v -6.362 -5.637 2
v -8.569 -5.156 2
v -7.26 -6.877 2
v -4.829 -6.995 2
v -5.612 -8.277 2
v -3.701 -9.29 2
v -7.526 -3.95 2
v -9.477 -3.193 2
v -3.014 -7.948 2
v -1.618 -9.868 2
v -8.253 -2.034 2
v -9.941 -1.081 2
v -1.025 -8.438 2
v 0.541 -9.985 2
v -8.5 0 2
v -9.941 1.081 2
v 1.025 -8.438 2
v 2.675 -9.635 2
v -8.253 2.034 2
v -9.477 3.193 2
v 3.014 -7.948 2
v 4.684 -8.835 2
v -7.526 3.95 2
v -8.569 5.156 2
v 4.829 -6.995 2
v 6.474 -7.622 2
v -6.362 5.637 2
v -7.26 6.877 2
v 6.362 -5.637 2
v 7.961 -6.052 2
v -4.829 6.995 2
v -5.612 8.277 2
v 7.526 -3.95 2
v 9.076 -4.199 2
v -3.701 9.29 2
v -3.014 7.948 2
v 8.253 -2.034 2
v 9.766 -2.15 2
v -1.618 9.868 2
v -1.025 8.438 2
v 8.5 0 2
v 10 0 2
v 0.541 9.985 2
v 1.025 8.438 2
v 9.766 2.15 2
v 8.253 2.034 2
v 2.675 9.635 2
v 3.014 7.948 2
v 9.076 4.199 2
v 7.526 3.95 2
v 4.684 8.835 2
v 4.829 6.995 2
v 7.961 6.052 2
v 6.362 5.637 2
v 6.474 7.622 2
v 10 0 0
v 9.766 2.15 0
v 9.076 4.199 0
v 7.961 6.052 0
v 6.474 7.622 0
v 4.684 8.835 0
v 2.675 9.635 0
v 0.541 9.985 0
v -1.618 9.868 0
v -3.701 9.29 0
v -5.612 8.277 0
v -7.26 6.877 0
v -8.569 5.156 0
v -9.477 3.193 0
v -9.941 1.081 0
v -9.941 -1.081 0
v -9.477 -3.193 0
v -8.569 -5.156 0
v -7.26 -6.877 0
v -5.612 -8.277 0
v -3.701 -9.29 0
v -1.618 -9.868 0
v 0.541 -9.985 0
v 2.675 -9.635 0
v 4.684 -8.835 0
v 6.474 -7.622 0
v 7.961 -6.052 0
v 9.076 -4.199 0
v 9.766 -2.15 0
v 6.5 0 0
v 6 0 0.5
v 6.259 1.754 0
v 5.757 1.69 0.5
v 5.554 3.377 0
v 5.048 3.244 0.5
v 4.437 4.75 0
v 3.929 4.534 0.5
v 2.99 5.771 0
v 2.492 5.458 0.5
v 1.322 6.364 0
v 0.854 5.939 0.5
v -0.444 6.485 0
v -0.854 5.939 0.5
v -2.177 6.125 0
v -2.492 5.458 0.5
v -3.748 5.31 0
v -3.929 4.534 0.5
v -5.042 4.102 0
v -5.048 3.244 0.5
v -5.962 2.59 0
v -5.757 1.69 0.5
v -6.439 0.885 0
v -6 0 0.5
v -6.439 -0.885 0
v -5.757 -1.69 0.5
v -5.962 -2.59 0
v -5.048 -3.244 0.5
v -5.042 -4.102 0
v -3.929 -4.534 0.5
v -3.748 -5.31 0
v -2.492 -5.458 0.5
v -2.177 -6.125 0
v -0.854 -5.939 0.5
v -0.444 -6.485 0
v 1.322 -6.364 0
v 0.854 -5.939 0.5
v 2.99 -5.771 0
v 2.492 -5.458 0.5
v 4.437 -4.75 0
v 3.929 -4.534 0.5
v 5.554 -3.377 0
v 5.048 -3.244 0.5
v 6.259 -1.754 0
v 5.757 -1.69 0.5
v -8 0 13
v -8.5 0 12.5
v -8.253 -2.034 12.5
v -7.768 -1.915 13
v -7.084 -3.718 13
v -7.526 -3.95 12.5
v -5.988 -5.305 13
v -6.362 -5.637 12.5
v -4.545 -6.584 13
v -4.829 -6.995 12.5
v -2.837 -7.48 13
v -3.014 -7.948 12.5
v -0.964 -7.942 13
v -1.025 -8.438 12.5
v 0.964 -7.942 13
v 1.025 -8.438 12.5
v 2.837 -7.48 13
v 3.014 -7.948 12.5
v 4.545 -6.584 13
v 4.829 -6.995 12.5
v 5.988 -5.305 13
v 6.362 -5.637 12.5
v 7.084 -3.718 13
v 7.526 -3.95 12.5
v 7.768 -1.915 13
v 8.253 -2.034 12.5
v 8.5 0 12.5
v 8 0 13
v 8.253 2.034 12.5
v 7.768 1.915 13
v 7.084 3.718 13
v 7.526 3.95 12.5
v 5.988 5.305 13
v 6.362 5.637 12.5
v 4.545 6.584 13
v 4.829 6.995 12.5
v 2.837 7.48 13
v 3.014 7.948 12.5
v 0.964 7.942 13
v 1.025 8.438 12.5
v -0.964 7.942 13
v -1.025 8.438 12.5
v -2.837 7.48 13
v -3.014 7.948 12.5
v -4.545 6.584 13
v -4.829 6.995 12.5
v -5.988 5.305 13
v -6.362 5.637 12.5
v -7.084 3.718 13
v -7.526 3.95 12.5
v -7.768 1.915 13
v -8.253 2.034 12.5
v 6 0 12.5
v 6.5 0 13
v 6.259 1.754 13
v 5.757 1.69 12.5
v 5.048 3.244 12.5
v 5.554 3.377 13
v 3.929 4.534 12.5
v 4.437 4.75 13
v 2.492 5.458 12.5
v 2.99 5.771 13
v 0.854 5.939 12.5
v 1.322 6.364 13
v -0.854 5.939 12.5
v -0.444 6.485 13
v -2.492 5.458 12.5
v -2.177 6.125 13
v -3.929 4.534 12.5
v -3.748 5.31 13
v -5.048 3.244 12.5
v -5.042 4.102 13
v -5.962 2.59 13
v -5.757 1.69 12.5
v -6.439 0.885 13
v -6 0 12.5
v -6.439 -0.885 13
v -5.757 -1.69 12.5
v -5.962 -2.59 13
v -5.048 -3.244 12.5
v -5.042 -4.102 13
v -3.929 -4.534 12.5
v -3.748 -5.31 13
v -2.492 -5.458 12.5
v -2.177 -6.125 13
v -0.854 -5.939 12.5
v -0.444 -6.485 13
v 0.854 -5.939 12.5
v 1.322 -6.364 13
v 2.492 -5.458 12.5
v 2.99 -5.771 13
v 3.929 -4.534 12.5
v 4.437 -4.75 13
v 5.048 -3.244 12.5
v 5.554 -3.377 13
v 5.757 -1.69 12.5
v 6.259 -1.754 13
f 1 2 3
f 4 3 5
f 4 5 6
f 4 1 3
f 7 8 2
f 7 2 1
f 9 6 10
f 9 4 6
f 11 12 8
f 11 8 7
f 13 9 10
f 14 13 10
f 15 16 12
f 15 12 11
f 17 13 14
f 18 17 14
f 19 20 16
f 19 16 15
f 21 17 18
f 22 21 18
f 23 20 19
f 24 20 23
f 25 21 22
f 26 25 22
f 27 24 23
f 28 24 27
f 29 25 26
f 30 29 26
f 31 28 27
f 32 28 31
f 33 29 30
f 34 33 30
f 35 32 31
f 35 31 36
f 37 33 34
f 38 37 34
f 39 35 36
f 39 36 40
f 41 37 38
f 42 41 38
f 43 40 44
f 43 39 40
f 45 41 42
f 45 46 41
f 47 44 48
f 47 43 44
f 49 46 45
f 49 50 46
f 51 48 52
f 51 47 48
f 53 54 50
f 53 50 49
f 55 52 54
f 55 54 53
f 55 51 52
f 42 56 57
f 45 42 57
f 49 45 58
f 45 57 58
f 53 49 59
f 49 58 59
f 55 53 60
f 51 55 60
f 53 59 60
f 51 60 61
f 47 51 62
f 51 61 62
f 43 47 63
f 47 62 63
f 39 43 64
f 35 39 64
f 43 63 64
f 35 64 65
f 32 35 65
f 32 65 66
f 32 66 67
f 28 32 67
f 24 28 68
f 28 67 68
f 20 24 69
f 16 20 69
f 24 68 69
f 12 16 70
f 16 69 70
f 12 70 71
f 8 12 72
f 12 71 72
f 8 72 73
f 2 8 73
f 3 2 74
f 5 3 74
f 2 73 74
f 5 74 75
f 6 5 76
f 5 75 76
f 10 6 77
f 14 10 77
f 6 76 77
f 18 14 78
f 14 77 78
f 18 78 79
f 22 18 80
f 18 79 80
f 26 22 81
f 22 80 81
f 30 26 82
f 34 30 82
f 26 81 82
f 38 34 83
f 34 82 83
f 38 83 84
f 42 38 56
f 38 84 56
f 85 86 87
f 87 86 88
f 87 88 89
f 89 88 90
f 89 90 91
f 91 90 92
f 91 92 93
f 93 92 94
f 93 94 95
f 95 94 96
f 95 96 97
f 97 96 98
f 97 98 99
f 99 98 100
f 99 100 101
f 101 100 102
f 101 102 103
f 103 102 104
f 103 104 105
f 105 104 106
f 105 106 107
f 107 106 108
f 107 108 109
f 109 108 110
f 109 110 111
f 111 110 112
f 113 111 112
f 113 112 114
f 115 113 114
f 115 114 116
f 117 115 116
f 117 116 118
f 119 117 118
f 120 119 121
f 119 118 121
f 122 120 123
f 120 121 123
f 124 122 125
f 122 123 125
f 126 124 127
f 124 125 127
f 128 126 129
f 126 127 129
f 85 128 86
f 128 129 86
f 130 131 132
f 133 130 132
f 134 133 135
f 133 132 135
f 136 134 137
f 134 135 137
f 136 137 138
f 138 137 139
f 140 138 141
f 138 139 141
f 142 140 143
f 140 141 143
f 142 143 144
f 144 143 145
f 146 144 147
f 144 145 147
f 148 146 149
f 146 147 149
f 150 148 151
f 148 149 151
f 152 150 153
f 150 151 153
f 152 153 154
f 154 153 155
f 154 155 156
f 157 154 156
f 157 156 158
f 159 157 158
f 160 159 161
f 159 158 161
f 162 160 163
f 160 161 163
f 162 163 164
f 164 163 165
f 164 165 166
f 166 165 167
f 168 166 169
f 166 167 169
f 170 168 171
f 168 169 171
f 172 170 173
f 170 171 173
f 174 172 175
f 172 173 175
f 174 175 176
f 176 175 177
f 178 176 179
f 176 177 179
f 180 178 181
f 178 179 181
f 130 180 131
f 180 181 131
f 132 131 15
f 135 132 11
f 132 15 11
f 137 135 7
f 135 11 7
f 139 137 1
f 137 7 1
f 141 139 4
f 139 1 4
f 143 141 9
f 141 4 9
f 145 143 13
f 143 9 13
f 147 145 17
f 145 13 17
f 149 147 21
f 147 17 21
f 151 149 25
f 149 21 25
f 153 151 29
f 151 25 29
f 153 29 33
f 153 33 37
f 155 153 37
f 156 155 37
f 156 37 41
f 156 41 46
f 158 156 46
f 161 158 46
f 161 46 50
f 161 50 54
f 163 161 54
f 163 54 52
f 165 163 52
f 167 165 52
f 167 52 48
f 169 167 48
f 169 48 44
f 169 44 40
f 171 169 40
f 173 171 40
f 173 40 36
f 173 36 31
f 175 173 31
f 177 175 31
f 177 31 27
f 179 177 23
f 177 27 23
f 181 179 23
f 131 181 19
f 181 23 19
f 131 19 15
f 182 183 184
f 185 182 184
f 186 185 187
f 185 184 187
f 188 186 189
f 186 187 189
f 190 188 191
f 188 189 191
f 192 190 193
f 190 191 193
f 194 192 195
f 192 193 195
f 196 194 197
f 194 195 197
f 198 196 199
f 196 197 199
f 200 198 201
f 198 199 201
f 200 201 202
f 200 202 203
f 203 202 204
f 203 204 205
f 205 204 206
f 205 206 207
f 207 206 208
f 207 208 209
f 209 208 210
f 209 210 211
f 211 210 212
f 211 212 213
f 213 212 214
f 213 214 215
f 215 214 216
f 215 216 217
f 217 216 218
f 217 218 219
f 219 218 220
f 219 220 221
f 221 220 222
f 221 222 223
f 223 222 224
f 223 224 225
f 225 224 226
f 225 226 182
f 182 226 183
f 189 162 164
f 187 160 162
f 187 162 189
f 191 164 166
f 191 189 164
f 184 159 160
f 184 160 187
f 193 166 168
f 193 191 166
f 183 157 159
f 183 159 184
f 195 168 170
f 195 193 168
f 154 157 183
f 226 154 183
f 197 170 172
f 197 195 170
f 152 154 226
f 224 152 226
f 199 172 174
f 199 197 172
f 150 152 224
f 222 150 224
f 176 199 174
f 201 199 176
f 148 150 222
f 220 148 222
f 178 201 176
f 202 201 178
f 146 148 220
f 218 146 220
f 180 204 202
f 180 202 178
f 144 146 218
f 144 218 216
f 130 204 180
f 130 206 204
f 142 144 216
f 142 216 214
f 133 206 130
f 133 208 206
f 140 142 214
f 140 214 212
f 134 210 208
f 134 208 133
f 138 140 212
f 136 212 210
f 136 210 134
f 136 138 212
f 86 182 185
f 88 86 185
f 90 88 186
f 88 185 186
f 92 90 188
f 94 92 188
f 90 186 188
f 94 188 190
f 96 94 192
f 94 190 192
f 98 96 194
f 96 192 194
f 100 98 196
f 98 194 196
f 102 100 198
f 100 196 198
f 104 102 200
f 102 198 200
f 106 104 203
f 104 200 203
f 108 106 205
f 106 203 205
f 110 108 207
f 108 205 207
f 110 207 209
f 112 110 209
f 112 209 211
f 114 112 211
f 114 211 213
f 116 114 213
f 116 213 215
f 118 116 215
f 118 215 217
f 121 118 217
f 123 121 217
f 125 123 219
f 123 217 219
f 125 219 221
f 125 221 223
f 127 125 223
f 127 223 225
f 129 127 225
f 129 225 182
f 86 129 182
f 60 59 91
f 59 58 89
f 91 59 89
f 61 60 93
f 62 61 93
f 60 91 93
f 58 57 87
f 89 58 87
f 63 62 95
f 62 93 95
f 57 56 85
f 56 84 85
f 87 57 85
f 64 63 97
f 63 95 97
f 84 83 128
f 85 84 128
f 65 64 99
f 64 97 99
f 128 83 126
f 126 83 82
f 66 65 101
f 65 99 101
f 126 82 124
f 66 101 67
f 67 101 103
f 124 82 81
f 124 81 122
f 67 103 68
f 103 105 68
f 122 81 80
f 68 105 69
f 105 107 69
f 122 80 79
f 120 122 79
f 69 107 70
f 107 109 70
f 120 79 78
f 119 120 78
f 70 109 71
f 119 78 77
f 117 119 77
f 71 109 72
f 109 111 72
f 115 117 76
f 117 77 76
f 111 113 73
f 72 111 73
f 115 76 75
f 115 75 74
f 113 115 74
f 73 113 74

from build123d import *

# Parameters (mm, degrees)
SKETCH_1_R          = 10
EXTRUDE_1_DEPTH     = 2
SKETCH_2_R          = 8.5
EXTRUDE_2_DEPTH     = 13
SKETCH_3_R          = 6
CUT_EXTRUDE_1_DEPTH = 20.209372712
CHAMFER_1_SIZE      = 0.5


with BuildPart() as part:
    # 草图1 → 凸台-拉伸1 (new body)
    with BuildSketch(Plane.XY):
        Circle(SKETCH_1_R)
    extrude(amount=EXTRUDE_1_DEPTH)

    # 草图2 → 凸台-拉伸2 (add)
    with BuildSketch(Plane.XY):
        with Locations(Location((0, 0, 0), (0, 0, 180))):
            Circle(SKETCH_2_R)
    extrude(amount=EXTRUDE_2_DEPTH)

    # 草图3 → 切除-拉伸1 (cut, through all)
    with BuildSketch(Plane.XY.offset(13)):
        Circle(SKETCH_3_R)
    extrude(amount=-CUT_EXTRUDE_1_DEPTH, mode=Mode.SUBTRACT)

    # 倒角1
    chamfer_1_edges = [part.edges().sort_by_distance(p)[0] for p in [
        (-6, 0, 0),
        (-6, 0, 13),
        (8.5, 0, 13),
    ]]
    chamfer(chamfer_1_edges, length=CHAMFER_1_SIZE)


solid = part.part
